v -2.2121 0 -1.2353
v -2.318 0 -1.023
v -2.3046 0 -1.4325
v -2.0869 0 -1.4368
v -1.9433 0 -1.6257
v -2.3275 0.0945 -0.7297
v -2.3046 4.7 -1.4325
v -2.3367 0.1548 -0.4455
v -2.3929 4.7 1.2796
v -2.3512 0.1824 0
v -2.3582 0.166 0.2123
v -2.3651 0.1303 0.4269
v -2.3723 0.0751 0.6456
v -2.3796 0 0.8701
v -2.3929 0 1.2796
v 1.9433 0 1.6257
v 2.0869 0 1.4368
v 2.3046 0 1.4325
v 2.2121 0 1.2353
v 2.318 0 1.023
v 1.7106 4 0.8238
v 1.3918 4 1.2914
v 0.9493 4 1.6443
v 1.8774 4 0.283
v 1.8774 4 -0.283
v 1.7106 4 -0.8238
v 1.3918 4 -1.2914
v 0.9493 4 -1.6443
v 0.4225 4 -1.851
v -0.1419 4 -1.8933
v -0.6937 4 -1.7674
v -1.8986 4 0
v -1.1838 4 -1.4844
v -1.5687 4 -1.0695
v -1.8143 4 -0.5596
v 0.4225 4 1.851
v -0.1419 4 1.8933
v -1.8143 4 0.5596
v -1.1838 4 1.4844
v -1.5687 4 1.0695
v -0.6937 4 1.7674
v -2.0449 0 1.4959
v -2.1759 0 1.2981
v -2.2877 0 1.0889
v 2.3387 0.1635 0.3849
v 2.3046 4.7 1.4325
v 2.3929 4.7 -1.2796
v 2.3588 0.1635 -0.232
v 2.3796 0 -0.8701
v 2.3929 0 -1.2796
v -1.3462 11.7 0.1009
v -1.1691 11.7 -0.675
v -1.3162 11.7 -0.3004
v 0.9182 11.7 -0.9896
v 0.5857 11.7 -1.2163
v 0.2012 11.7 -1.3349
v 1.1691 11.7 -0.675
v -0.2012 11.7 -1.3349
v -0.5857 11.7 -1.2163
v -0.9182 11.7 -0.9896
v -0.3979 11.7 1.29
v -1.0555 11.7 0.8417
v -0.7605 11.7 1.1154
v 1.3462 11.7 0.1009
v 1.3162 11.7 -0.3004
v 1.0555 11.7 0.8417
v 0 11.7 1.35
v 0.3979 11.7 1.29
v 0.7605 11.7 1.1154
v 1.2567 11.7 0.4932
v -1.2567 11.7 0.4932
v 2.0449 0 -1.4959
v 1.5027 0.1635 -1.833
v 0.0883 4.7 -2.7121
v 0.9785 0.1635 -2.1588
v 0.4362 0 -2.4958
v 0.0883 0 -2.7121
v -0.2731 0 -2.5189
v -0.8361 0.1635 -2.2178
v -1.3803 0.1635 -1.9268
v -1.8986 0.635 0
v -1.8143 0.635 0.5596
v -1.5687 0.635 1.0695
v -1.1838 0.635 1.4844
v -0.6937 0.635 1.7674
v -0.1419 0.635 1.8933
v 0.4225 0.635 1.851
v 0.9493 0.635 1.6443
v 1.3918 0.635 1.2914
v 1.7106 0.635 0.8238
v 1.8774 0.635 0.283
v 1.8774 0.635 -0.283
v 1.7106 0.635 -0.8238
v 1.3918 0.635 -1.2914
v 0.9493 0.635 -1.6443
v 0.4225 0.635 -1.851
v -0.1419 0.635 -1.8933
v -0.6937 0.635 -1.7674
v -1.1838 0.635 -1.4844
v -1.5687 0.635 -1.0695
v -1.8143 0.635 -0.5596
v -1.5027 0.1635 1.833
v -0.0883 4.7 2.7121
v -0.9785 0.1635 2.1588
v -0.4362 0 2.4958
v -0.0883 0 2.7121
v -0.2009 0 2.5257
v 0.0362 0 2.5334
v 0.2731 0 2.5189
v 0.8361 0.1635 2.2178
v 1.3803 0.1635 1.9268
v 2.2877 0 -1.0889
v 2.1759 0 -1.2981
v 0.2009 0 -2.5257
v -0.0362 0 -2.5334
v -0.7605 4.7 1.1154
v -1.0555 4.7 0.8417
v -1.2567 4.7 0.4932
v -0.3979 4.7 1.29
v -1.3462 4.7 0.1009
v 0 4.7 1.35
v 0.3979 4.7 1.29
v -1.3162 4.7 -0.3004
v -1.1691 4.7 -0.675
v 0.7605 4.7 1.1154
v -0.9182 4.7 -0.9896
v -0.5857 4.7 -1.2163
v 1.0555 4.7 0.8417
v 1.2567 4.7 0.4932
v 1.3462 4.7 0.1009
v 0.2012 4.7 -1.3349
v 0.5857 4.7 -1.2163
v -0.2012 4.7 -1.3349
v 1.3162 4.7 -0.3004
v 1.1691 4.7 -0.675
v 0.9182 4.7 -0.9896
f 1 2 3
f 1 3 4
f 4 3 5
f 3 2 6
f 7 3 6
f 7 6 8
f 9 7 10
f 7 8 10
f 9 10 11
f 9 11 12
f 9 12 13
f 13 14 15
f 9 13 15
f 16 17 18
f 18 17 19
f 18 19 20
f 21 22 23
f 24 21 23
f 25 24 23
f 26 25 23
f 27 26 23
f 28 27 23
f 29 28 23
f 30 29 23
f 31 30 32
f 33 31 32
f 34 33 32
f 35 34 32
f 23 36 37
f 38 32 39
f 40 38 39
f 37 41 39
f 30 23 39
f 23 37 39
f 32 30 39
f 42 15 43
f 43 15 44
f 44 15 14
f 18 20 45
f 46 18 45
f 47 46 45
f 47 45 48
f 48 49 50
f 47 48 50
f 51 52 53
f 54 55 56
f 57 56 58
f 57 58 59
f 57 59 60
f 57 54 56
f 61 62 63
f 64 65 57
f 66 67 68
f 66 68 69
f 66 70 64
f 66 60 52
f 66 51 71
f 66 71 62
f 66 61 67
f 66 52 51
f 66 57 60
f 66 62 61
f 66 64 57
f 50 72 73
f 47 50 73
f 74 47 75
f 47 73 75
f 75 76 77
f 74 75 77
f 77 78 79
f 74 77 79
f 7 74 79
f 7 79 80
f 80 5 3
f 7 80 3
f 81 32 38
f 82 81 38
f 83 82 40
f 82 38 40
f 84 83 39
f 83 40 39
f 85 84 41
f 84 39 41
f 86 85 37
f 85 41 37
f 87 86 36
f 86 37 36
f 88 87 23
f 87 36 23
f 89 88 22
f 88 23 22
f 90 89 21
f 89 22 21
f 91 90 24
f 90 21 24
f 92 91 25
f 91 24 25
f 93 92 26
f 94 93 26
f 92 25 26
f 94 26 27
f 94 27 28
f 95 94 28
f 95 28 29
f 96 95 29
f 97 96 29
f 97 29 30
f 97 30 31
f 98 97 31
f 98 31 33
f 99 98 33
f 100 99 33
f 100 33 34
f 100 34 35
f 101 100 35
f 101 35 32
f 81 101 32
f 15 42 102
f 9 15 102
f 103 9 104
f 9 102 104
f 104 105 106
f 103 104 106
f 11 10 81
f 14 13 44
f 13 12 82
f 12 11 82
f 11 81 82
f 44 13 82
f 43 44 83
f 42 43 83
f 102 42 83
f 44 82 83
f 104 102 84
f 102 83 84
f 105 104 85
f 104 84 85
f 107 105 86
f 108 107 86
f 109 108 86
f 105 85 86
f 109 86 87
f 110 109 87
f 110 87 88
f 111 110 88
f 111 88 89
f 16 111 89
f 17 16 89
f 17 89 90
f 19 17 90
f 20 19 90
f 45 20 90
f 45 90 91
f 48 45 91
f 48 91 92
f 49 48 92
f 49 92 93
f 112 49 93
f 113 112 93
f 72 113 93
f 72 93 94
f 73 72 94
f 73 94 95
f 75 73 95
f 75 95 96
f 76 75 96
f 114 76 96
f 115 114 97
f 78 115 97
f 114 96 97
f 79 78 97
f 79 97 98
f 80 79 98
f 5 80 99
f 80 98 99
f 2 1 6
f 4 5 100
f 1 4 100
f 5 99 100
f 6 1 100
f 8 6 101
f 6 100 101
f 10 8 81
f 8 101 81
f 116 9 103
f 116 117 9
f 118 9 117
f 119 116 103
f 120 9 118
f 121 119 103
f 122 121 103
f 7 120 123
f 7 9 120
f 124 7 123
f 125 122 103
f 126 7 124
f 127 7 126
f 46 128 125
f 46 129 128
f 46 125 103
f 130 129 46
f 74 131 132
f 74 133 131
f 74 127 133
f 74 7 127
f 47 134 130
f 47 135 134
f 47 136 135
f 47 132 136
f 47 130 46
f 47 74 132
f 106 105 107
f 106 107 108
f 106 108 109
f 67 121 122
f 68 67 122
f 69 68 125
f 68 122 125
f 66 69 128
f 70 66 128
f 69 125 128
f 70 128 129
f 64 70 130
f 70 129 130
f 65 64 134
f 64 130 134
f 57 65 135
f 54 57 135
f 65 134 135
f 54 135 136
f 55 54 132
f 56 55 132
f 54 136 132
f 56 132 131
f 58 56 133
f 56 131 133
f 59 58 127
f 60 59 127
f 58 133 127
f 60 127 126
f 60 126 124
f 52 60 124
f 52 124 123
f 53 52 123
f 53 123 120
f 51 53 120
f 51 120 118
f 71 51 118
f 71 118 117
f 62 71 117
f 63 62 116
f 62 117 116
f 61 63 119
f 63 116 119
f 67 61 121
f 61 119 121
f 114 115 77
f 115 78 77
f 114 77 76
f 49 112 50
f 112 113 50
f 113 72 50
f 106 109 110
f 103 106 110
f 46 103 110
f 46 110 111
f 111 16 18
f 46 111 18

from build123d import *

# Parameters (mm, degrees)
EXTRUDE_1_DEPTH                 = 4.7
HOLE_WIZARD_10_24_1_D           = 3.7973
HOLE_WIZARD_10_24_1_DEPTH       = 4
HOLE_WIZARD_10_24_1_CSINK_D     = 5.0673
HOLE_WIZARD_10_24_1_CSINK_ANGLE = 90
SKETCH_5_R                      = 1.35
EXTRUDE_2_DEPTH                 = 7


with BuildPart() as part:
    # 草图1 → 凸台-拉伸1 (new body)
    with BuildSketch(Plane(origin=(0, 0, 0), x_dir=(1, 0, 0), z_dir=(0, 1, 0))):
        Polygon((2.304627048, -1.432489966), (2.392886225, 1.279620587), (0.088259177, 2.712110553), (-2.304627048, 1.432489966), (-2.392886225, -1.279620587), (-0.088259177, -2.712110553), align=None)
    extrude(amount=EXTRUDE_1_DEPTH)

    # #10-24 螺纹孔1
    with Locations(Plane.XZ):
        with Locations((0, 0)):
            CounterSinkHole(HOLE_WIZARD_10_24_1_D / 2, HOLE_WIZARD_10_24_1_CSINK_D / 2, depth=HOLE_WIZARD_10_24_1_DEPTH, counter_sink_angle=HOLE_WIZARD_10_24_1_CSINK_ANGLE)

    # 草图5 → 凸台-拉伸2 (add)
    with BuildSketch(Plane(origin=(0, 4.7, 0), x_dir=(-1, 0, 0), z_dir=(0, 1, 0))):
        with Locations(Location((0, 0, 0), (0, 0, 90))):
            Circle(SKETCH_5_R)
    extrude(amount=EXTRUDE_2_DEPTH)


solid = part.part
